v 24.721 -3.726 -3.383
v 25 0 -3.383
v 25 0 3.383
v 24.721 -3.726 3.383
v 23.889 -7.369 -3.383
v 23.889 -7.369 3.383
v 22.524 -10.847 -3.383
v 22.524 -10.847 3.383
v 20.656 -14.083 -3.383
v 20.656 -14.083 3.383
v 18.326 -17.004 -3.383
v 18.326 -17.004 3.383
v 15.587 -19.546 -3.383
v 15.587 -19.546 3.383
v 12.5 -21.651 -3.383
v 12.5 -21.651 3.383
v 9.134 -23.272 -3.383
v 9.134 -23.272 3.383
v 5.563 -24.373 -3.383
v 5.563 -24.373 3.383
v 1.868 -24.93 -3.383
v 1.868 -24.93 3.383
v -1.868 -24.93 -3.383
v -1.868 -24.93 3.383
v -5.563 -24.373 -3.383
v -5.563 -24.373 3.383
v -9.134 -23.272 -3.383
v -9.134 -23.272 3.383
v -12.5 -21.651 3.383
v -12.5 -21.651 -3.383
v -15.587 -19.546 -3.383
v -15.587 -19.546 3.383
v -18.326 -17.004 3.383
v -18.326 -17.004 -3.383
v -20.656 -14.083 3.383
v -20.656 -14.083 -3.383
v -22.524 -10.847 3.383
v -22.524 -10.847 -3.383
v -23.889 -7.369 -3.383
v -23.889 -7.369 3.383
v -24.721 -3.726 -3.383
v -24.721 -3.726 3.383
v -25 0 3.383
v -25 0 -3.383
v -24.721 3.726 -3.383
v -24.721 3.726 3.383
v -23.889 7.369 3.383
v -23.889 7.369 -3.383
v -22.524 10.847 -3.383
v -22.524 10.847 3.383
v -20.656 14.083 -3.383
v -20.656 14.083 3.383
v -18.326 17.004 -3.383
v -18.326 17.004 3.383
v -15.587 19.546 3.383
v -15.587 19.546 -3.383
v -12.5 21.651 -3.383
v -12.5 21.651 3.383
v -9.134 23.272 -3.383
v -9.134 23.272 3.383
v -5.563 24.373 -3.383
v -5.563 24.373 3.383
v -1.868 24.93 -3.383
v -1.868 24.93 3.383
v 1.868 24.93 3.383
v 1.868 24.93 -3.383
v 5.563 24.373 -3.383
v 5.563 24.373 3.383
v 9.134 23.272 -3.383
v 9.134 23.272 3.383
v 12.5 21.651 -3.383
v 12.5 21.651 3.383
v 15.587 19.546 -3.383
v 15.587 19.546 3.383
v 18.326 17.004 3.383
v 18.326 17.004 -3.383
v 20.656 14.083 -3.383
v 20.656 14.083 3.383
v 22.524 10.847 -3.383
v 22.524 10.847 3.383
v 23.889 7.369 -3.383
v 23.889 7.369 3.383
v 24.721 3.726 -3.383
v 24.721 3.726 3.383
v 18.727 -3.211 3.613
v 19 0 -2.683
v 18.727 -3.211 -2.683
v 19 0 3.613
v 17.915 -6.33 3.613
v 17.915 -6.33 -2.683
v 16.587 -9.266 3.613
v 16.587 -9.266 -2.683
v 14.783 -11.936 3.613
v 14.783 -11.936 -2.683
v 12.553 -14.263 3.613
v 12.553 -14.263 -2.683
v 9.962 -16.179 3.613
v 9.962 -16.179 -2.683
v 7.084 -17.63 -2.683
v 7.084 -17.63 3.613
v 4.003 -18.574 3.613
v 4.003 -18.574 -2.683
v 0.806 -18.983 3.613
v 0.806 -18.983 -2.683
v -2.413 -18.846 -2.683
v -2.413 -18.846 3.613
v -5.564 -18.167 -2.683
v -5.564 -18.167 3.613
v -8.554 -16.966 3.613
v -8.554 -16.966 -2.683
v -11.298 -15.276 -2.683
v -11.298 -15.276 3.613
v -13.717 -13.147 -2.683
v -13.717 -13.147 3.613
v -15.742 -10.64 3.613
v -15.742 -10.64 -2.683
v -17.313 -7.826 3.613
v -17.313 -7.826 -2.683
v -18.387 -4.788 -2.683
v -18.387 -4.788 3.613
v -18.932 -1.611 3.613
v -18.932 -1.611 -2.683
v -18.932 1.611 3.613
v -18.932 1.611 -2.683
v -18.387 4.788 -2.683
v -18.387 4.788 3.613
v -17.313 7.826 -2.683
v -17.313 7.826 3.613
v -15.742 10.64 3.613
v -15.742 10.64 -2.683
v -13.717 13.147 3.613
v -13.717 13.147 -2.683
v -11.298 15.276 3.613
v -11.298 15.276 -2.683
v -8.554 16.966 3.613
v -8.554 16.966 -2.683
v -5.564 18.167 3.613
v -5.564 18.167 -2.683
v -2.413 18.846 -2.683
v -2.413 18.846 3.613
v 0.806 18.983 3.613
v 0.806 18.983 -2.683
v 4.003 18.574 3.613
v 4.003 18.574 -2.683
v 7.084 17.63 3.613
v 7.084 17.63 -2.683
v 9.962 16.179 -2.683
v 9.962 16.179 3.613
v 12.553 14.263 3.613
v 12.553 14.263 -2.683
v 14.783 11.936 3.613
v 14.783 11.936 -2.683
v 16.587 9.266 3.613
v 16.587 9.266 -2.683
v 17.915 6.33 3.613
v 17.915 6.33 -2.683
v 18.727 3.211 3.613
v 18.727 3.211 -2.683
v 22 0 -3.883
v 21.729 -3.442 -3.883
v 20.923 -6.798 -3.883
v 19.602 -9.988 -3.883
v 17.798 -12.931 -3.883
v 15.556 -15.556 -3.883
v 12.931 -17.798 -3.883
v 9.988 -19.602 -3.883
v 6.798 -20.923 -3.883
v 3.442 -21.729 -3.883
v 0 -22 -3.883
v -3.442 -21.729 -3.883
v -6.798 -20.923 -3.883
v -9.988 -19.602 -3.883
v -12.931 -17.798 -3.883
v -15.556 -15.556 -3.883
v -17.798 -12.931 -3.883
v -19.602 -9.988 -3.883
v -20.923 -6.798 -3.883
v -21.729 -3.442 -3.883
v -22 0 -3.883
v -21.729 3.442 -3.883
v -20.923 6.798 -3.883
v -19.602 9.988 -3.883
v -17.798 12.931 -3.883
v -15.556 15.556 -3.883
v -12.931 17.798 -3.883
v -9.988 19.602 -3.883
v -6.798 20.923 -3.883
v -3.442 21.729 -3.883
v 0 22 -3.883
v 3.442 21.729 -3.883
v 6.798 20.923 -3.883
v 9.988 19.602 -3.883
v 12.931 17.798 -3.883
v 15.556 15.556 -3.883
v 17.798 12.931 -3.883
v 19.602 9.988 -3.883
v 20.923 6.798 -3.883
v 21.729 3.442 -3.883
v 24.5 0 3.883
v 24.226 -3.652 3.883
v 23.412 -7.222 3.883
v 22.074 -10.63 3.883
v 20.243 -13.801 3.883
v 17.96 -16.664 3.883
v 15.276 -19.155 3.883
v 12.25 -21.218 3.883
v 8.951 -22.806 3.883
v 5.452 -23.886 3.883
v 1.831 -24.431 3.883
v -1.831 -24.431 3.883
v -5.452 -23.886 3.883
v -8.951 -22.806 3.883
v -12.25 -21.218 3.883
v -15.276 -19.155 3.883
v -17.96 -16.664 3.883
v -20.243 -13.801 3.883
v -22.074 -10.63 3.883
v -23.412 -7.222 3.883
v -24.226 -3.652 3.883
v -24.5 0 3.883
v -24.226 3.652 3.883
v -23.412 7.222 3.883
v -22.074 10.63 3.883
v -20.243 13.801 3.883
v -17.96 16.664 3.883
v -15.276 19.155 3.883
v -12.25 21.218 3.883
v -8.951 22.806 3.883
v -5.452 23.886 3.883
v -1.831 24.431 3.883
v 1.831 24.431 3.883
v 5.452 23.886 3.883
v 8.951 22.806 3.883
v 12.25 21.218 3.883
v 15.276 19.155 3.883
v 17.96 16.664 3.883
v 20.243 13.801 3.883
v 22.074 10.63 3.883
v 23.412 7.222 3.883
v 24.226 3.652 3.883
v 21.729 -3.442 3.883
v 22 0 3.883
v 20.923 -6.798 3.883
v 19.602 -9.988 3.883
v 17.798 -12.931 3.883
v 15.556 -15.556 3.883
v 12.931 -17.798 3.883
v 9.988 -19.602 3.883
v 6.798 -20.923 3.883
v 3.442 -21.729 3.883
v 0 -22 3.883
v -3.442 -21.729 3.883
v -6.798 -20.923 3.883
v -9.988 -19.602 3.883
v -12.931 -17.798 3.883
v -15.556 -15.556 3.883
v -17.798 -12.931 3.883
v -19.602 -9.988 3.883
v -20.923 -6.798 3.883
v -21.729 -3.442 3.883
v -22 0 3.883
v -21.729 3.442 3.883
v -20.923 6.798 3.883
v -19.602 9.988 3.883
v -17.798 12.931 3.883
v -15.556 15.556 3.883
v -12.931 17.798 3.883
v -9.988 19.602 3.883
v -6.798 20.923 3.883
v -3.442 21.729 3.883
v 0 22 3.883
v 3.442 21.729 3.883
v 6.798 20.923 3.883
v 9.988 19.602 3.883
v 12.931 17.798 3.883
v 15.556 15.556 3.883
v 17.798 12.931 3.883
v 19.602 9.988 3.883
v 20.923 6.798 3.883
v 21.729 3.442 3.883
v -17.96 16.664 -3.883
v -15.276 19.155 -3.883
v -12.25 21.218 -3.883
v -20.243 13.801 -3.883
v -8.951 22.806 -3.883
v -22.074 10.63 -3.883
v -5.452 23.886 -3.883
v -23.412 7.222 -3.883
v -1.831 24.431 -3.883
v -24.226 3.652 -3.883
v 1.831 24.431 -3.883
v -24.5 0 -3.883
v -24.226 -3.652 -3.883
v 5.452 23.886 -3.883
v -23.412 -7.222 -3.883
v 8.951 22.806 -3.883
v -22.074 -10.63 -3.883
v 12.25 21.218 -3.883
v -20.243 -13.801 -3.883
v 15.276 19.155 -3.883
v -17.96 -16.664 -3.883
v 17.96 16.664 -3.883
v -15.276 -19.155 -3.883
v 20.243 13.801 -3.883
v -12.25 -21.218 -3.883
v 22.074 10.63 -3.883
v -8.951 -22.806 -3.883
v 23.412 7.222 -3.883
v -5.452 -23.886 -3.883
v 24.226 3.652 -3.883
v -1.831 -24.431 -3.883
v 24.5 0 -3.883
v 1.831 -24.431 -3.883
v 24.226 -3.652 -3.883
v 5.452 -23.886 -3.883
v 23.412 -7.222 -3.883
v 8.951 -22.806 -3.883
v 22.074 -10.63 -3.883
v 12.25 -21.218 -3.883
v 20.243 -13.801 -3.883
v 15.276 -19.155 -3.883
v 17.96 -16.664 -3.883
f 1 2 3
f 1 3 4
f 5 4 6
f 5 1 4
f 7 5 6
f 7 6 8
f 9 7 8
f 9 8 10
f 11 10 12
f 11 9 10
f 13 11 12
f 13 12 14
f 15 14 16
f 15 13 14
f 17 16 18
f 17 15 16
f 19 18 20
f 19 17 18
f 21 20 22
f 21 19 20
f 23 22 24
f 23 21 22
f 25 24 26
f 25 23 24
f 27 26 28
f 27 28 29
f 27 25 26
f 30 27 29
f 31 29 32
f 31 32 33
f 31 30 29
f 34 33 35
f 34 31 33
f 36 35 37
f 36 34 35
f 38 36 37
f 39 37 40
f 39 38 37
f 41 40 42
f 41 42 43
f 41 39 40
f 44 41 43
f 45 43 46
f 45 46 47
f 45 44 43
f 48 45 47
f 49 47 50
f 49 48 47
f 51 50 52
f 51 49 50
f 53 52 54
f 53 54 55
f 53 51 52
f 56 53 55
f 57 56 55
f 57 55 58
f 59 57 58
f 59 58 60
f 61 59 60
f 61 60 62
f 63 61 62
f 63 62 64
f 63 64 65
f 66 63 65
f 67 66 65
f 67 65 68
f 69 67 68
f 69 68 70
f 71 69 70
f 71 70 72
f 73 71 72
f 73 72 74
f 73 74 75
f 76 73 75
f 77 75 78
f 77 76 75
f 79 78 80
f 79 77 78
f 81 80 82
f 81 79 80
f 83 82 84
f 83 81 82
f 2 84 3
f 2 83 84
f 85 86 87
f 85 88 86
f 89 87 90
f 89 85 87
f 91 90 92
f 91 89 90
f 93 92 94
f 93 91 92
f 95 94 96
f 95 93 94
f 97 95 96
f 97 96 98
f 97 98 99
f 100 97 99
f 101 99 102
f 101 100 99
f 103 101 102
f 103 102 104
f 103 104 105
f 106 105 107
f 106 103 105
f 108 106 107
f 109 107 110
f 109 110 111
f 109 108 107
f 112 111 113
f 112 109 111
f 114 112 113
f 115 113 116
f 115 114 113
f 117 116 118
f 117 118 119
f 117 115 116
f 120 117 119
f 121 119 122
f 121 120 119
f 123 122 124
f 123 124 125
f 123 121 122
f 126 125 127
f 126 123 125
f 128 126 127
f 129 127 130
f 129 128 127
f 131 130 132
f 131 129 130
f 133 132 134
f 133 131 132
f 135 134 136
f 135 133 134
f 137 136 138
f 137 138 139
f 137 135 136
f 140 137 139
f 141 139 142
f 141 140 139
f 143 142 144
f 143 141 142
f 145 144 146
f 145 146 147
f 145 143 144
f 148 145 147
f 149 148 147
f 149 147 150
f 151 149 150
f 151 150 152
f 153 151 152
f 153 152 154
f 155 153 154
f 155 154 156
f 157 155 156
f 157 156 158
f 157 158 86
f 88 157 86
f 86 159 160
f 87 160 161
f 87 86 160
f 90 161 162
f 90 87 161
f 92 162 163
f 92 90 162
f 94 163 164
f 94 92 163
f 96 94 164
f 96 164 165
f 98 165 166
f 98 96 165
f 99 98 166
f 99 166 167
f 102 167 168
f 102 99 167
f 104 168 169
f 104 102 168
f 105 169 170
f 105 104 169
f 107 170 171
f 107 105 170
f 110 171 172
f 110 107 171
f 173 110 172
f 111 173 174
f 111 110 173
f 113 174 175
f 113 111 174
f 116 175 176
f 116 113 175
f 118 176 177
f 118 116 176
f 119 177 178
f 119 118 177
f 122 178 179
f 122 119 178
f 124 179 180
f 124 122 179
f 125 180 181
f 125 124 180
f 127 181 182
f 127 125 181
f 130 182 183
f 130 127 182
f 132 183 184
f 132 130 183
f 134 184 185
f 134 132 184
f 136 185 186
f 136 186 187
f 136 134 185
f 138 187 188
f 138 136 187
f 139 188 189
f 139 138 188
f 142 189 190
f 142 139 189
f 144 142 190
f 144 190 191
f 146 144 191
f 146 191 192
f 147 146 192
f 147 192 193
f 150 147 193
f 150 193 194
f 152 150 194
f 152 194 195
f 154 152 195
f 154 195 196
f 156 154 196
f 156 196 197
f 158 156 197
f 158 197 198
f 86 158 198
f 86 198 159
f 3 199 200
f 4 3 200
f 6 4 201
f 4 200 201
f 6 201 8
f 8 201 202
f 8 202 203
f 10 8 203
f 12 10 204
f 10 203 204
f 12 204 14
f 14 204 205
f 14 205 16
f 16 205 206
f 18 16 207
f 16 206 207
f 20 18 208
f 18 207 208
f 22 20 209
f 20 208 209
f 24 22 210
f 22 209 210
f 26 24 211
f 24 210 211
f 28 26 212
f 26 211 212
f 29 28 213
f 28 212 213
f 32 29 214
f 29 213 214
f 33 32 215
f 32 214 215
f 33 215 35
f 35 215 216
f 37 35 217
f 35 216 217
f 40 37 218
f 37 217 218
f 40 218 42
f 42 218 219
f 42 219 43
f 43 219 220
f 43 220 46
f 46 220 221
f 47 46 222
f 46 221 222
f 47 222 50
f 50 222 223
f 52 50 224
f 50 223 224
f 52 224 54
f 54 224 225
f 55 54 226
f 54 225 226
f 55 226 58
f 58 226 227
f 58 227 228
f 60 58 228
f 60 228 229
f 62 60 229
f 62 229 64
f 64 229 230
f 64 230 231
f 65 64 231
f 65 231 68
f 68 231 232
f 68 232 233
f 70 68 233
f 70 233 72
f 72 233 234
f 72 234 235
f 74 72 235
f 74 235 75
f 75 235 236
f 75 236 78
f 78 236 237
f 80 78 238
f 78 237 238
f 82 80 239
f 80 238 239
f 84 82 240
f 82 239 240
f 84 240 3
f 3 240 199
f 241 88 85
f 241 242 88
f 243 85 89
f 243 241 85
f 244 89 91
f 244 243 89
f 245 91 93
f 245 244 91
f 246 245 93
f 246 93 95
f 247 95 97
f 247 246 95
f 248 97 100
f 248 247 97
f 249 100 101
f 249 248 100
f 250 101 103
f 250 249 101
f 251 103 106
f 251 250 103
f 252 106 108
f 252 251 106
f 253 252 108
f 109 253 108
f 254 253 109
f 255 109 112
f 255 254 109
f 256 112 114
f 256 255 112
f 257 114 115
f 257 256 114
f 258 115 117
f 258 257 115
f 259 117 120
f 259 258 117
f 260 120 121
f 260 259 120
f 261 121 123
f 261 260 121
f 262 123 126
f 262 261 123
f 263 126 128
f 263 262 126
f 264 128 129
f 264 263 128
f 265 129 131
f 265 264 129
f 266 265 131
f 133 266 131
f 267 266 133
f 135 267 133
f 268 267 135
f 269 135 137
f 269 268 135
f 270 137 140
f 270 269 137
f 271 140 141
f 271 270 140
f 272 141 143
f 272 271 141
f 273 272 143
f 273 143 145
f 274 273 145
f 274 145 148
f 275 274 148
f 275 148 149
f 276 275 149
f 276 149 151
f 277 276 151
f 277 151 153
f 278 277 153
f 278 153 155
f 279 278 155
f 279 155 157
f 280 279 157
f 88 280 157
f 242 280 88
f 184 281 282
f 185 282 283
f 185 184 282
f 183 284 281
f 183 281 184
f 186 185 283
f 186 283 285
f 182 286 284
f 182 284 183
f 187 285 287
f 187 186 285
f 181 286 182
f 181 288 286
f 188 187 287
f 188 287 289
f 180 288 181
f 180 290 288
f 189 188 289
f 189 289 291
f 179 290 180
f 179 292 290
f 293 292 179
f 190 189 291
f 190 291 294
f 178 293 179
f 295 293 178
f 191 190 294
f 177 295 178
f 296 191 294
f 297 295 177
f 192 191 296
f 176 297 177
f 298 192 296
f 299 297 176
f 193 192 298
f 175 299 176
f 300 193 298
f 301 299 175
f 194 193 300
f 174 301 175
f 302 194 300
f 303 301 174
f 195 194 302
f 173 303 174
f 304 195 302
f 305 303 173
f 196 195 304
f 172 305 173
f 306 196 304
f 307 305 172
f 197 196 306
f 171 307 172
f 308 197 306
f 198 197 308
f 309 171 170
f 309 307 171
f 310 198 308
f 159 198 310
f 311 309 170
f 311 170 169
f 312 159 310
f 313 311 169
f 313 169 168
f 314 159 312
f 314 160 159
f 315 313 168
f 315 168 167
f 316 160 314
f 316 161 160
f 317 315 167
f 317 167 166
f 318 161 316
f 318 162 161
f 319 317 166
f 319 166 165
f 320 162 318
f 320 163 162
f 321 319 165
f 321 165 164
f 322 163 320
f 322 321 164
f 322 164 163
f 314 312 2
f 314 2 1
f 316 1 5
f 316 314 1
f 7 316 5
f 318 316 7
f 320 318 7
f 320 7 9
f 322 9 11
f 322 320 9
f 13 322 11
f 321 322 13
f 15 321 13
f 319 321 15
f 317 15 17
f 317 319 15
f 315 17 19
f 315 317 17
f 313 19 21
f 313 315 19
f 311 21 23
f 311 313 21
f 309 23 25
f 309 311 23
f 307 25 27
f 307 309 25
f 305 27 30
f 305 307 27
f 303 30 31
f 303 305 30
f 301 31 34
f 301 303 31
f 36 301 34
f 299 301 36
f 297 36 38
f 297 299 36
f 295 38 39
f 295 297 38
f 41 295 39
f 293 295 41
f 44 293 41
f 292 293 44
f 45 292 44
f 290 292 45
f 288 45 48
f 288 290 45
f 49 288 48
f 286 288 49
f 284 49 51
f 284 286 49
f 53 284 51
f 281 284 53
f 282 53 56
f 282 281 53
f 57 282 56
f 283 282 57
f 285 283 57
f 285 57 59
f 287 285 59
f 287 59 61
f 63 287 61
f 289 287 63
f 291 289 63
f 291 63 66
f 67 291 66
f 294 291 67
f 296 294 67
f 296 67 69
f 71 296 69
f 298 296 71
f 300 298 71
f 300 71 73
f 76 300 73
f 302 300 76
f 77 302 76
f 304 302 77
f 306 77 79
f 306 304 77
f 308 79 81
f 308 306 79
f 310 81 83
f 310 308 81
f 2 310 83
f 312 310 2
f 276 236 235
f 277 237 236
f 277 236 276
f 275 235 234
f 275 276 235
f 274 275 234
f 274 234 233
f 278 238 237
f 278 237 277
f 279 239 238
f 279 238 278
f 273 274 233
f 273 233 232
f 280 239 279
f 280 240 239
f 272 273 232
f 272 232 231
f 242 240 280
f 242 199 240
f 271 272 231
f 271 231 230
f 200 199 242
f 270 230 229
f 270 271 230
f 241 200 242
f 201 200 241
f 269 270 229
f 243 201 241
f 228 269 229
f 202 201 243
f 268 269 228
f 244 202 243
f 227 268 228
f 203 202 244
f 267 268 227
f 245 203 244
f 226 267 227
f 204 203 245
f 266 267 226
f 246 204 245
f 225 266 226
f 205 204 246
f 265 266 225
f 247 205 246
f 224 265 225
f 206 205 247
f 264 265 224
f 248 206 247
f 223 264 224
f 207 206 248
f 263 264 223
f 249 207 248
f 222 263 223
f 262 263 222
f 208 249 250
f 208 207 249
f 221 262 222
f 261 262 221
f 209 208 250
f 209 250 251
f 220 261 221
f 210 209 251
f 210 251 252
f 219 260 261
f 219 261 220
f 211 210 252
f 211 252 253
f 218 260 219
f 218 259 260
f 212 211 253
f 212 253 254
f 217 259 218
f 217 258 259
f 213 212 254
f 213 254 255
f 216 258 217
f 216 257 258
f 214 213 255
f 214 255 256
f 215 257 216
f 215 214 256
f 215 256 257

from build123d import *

# Parameters (mm, degrees)
CHAMFER1_SIZE = 0.5


with BuildPart() as part:
    # Sketch1 → Revolve1 (revolve)
    with BuildSketch(Plane(origin=(0, 0, 0), x_dir=(0, 0, -1), z_dir=(1, 0, 0)), mode=Mode.PRIVATE) as revolve1_sk:
        Polygon((-3.88315, 25), (3.88315, 25), (3.88315, 22), (2.682605307, 19), (-3.612740697, 19), (-3.88315, 22), align=None)
    revolve(revolve1_sk.sketch.rotate(Axis((0, 0, 4.95), (0, 0, -1)), 90), axis=Axis((0, 0, 4.95), (0, 0, -1)))

    # Chamfer1
    chamfer1_edges = [part.edges().sort_by_distance(p)[0] for p in [
        (-25, 0, 3.88315),
        (-25, 0, -3.88315),
    ]]
    chamfer(chamfer1_edges, length=CHAMFER1_SIZE)


solid = part.part
